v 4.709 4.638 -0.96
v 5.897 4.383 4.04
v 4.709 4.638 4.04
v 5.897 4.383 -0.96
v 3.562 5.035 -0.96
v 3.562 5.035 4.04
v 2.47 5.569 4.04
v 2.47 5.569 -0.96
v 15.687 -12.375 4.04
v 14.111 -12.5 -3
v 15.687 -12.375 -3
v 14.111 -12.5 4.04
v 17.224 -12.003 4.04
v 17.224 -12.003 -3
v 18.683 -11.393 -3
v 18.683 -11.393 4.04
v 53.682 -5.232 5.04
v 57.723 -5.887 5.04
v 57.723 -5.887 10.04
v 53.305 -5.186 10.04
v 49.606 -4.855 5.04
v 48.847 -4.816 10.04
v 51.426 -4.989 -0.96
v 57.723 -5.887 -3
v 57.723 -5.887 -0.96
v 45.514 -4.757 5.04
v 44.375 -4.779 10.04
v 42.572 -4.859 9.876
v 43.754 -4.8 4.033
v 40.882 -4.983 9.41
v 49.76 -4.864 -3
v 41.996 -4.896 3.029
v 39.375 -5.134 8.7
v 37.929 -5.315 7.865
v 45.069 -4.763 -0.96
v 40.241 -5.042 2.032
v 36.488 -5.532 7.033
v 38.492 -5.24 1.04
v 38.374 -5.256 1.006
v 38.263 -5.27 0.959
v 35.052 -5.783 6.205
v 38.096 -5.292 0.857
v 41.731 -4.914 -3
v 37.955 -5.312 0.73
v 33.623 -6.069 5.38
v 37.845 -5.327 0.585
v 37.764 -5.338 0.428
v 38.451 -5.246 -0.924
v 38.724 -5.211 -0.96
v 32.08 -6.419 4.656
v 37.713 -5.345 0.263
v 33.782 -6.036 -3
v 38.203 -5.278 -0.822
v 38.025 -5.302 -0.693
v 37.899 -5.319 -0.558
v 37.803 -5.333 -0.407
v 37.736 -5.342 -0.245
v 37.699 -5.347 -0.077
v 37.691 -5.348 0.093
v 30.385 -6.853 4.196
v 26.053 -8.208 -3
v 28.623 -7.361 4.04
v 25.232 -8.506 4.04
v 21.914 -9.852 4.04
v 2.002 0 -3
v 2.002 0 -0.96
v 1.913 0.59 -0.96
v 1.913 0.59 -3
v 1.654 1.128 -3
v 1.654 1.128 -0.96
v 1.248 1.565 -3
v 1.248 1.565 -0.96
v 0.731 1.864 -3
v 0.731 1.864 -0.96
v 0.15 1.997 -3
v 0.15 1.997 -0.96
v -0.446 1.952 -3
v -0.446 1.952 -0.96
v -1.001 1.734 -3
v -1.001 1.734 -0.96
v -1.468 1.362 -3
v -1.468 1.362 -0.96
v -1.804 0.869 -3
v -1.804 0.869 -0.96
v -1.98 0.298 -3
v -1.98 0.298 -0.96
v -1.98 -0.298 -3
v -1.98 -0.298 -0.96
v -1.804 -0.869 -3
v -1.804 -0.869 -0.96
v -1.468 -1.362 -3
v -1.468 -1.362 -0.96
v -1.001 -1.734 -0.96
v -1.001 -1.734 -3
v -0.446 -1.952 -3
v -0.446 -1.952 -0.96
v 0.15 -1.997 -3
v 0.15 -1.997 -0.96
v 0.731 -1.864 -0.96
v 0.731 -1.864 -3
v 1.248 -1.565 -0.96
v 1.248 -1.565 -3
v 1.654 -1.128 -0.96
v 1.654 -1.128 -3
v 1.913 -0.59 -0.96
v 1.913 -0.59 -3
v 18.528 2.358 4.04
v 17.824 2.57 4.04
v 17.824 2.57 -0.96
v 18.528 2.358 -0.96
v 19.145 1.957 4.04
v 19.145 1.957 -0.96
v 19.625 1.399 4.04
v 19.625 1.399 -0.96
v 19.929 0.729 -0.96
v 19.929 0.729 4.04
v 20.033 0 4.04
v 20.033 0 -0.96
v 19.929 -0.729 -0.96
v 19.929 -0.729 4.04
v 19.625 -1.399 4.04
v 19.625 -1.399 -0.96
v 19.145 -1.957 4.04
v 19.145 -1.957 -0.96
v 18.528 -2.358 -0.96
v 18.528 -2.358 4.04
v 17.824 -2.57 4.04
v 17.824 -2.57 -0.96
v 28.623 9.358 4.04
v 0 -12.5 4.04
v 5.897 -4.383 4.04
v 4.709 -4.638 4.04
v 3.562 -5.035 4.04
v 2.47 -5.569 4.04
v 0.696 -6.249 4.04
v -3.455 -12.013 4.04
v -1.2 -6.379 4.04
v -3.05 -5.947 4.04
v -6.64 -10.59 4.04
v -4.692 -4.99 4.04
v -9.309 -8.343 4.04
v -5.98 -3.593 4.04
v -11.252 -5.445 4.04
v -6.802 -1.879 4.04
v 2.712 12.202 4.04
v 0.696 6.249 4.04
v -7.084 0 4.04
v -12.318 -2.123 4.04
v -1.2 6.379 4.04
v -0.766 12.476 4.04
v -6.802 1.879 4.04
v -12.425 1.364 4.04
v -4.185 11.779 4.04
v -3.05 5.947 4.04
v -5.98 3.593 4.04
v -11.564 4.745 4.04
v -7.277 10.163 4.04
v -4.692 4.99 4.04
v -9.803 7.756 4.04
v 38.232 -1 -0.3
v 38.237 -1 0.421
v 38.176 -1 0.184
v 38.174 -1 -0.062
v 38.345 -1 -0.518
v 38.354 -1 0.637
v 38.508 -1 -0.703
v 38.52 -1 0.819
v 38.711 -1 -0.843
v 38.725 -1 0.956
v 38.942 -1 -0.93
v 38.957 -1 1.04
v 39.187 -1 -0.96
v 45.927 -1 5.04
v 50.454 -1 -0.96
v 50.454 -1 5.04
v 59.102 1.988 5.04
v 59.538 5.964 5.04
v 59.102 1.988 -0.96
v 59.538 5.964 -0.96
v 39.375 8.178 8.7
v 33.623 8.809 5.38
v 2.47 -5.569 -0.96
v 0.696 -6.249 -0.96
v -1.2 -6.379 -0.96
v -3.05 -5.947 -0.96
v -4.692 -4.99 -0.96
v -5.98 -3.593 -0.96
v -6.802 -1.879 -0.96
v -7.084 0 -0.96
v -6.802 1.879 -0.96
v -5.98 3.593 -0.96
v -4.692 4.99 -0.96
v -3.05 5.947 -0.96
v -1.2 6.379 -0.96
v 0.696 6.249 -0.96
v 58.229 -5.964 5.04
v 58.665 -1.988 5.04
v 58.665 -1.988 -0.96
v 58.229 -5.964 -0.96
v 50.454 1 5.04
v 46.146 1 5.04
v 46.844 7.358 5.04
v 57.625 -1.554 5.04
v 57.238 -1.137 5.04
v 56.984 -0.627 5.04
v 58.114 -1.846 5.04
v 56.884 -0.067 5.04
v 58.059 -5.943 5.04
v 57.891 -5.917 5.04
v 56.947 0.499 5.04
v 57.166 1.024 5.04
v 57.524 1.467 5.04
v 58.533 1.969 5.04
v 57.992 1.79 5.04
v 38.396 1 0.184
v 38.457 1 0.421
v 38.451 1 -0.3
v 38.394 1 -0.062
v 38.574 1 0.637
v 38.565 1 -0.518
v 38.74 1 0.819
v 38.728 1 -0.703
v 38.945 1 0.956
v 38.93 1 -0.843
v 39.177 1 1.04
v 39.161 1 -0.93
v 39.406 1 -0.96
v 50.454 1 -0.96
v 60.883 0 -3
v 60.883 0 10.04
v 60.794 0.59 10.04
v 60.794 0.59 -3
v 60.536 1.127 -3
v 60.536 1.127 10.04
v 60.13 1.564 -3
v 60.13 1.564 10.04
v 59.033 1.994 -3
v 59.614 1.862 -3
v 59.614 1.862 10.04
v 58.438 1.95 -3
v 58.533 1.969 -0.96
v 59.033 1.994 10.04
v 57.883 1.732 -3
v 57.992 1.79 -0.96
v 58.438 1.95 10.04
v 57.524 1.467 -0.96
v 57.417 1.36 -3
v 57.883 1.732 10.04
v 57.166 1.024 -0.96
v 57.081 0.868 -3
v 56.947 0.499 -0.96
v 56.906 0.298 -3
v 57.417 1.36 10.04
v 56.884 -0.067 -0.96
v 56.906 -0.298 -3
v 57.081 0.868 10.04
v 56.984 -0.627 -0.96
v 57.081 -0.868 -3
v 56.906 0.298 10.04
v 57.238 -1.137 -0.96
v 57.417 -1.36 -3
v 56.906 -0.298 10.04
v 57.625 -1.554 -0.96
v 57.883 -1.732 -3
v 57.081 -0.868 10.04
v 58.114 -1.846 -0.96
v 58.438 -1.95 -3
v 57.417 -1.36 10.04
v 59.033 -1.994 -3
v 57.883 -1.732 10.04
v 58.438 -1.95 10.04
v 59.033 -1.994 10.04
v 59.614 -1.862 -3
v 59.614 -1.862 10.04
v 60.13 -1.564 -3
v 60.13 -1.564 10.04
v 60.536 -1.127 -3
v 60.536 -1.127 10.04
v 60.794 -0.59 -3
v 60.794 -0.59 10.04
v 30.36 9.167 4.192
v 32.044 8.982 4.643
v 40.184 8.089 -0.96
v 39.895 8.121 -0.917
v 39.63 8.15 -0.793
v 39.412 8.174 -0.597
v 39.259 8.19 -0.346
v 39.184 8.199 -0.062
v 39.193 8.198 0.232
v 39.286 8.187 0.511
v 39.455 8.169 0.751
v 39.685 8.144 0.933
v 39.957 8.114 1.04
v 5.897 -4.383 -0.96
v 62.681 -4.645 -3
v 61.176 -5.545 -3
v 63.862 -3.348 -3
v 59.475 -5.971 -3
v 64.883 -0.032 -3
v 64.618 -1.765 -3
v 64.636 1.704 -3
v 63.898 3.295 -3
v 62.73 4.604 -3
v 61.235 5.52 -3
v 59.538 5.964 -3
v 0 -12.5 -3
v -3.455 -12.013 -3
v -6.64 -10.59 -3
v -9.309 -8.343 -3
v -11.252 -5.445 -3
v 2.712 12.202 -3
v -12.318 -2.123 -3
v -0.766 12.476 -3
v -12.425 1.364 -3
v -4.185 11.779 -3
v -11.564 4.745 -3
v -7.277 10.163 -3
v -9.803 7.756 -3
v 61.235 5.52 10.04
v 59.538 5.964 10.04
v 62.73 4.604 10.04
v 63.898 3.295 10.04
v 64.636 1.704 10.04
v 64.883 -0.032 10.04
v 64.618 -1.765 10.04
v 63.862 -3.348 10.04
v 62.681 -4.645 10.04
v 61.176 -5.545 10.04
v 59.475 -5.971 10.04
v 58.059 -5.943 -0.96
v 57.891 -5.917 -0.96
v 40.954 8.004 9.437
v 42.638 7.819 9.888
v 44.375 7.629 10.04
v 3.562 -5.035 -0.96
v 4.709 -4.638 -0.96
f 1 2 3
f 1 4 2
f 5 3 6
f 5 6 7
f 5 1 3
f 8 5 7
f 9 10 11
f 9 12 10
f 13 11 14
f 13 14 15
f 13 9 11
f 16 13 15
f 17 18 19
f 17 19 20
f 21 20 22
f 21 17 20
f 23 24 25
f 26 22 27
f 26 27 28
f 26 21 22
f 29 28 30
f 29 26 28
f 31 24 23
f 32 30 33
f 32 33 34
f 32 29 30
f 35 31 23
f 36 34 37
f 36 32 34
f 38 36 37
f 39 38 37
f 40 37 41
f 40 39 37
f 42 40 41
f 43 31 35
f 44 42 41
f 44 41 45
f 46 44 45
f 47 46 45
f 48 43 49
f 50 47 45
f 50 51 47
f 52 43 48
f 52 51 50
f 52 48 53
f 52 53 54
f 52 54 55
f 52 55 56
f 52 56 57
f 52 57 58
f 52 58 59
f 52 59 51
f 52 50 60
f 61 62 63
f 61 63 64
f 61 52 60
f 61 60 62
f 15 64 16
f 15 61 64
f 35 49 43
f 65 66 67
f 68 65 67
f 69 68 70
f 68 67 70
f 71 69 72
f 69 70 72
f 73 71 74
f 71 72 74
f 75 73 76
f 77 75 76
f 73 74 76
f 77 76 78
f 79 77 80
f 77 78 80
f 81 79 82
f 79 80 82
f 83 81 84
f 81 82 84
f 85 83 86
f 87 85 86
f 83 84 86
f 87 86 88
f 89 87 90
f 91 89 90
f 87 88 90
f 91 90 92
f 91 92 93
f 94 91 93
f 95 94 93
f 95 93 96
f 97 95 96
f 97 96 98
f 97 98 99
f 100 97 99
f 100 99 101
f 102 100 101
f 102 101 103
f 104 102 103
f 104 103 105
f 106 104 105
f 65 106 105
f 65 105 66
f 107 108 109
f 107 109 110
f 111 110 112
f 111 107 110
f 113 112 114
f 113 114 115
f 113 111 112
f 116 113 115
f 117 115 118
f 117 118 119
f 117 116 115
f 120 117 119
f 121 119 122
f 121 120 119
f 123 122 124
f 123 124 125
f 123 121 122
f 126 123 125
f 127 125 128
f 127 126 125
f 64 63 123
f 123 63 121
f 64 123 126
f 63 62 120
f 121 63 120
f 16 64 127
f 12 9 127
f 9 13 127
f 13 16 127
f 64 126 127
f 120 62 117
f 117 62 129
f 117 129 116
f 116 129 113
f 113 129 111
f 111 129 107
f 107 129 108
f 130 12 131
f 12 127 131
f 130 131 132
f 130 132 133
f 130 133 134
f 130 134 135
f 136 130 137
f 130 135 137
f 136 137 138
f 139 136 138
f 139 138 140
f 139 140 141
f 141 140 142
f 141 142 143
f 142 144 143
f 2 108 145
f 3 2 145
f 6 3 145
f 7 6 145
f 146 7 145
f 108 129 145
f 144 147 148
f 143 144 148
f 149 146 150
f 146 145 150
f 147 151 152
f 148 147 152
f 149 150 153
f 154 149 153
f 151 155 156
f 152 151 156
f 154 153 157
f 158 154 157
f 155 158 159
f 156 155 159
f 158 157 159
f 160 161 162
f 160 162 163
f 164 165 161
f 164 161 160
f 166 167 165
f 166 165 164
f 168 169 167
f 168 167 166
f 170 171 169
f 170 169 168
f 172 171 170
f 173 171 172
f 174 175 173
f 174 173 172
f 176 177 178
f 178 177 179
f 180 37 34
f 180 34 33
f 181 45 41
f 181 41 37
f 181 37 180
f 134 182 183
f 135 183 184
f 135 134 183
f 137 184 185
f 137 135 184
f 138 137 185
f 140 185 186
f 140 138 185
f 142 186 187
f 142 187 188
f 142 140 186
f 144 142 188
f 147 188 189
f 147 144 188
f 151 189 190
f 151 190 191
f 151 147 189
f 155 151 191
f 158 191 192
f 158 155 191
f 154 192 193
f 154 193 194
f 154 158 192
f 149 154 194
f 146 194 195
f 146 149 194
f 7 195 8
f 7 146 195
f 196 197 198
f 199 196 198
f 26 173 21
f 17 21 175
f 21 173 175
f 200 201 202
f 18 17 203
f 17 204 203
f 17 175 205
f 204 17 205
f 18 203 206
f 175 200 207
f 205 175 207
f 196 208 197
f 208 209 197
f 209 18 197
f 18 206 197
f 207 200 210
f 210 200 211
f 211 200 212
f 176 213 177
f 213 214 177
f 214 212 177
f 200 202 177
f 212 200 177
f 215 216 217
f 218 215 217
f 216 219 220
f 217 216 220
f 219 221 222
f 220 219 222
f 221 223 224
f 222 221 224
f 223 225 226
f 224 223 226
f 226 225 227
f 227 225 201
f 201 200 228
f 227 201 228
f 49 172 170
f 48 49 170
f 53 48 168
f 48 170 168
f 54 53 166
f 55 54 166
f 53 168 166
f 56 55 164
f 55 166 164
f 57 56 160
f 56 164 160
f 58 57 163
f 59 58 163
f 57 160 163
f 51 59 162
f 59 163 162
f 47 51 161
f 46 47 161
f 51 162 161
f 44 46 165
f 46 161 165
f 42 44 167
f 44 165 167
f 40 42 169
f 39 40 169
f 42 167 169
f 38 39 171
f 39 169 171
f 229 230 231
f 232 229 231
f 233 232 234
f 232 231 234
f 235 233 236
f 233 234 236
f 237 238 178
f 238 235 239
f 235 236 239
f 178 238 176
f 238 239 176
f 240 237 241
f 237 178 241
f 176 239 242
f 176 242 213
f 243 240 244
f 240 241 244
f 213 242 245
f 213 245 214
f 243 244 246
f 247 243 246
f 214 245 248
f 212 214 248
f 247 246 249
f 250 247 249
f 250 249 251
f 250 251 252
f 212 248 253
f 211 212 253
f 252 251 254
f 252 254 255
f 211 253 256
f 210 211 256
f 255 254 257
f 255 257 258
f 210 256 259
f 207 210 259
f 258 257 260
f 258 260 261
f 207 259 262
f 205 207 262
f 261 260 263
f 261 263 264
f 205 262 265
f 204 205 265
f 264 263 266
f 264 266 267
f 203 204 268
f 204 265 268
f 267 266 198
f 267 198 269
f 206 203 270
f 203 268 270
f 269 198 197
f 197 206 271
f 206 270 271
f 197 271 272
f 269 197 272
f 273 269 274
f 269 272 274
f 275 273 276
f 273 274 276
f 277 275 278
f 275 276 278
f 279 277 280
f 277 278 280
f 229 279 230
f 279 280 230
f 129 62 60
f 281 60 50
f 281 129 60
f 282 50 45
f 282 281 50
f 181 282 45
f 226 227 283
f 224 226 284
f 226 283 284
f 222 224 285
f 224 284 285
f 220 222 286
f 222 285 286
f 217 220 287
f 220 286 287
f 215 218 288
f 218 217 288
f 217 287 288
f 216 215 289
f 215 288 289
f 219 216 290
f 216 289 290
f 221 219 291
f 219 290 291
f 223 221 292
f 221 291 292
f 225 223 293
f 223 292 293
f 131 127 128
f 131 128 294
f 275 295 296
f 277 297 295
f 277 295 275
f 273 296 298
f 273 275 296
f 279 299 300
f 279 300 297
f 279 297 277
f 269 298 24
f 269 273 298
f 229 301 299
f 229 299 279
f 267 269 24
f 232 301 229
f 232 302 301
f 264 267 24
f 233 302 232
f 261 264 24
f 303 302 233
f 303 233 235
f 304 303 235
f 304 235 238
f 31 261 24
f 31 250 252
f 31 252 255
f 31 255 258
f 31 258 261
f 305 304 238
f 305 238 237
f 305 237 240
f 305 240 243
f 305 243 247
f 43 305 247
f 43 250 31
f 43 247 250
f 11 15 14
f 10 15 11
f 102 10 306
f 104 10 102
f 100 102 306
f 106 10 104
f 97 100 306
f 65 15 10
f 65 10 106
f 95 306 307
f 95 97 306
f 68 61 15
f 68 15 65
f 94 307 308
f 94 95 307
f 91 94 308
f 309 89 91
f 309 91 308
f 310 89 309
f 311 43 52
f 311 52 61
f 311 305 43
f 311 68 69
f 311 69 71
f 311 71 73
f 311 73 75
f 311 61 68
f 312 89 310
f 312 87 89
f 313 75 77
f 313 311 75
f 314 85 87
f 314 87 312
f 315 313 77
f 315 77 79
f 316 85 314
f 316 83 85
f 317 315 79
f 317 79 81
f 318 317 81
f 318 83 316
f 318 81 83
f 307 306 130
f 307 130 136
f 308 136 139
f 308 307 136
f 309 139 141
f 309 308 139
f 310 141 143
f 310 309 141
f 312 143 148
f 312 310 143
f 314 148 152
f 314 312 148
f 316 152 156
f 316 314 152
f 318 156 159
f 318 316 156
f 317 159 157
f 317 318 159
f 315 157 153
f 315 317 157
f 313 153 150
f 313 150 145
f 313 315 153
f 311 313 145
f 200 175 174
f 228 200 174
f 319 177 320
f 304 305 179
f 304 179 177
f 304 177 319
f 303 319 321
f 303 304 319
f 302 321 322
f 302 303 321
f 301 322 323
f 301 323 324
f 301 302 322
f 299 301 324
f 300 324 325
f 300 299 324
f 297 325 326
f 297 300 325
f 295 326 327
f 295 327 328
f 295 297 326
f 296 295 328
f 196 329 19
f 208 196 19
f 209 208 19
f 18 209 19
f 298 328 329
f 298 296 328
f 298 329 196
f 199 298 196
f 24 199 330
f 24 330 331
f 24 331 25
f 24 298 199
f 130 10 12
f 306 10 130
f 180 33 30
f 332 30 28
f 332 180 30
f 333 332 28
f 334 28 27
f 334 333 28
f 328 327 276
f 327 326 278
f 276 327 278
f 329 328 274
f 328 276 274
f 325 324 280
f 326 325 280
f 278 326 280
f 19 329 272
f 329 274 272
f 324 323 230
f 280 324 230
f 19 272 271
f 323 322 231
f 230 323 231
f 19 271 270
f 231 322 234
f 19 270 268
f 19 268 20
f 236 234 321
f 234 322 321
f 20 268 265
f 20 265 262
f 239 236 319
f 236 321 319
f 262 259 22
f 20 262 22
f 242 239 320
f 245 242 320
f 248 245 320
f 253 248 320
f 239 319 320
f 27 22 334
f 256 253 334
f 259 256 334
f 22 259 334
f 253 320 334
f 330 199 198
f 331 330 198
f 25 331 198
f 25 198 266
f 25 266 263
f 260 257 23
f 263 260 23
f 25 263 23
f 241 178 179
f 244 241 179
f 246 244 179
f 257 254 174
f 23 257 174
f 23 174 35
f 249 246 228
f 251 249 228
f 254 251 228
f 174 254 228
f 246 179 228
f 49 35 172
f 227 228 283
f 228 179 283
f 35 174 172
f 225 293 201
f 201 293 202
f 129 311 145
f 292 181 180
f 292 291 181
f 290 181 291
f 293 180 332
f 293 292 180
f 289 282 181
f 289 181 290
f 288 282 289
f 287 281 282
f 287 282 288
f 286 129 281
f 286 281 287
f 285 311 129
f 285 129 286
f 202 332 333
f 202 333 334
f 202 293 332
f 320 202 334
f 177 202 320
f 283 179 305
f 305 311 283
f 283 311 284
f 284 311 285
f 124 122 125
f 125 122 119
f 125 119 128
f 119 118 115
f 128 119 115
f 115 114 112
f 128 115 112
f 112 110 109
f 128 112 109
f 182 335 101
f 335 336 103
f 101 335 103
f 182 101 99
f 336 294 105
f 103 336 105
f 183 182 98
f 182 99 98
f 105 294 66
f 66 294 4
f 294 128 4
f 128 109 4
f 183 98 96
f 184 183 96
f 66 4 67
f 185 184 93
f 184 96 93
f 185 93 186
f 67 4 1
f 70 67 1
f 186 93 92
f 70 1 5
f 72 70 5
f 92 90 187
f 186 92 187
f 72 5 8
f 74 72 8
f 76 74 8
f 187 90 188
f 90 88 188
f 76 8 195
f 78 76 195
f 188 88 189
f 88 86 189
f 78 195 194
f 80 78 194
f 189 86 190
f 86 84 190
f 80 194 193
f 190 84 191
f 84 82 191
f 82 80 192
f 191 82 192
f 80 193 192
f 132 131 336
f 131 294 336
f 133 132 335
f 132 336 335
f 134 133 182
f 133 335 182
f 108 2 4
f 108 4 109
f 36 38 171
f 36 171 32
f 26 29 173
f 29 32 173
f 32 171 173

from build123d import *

# Parameters (mm, degrees)
EXTRUDE_1_DEPTH     = 4.04
EXTRUDE_START       = 3
EXTRUDE_2_DEPTH     = 3
EXTRUDE_3_DEPTH     = 6
CUT_EXTRUDE_1_DEPTH = 69.95015268178993
CUT_EXTRUDE_2_DEPTH = 5
DRAFT_1_ANGLE       = 60.000000000000234
CUT_EXTRUDE_3_REACH = 69.351
SKETCH_6_R          = 2.000000000000003
SKETCH_7_R          = 2.002237129098131
CUT_EXTRUDE_4_DEPTH = 5
RIB_1_REACH         = 68.835
SKETCH_8_WALL_W     = 141.6697430182401
SKETCH_8_WALL_H     = 2
FILLET_1_R          = 10
FILLET_2_R          = 10


with BuildPart() as part:
    # 草图1 → 凸台-拉伸1 (new body)
    with BuildSketch(Plane.XY):
        with BuildLine():
            Line((2.711712708194342, 12.202320033019019), (59.53806556534447, 5.964171430093859))
            ThreePointArc((59.53806556534447, 5.964171430093859), (64.81417632321985, -0.9084264437888516), (57.72286495852592, -5.886704197633859))
            ThreePointArc((57.72286495852592, -5.886704197633859), (36.58461274967972, -5.515977162880489), (16.63, -12.5))
            Line((16.63, -12.5), (0, -12.5))
            ThreePointArc((0, -12.5), (-12.425357146028794, 1.364001390626533), (2.711712708194342, 12.202320033019019))
        make_face()
    extrude(amount=EXTRUDE_1_DEPTH)

    # 草图2 → 凸台-拉伸2 (add)
    with BuildSketch(Plane(origin=(0, 0, 0), x_dir=(-1, 0, 0), z_dir=(0, 0, -1)).offset(EXTRUDE_START)):
        with BuildLine():
            Line((-16.629999999999995, -12.500000000000004), (2.3e-15, -12.5))
            ThreePointArc((2.3e-15, -12.5), (12.425357146028796, 1.3640013906265342), (-2.711712708194334, 12.202320033019022))
            Line((-2.711712708194334, 12.202320033019022), (-59.53806556534447, 5.964171430093854))
            ThreePointArc((-59.53806556534447, 5.964171430093854), (-64.81417632321985, -0.9084264437888536), (-57.72286495852591, -5.886704197633859))
            ThreePointArc((-57.72286495852591, -5.886704197633859), (-36.584612749679714, -5.515977162880482), (-16.629999999999995, -12.500000000000004))
        make_face()
    extrude(amount=-EXTRUDE_2_DEPTH)

    # 草图3 → 凸台-拉伸3 (add)
    with BuildSketch(Plane.XY.offset(4.04)):
        with BuildLine():
            Line((31.302864958525912, 9.063708323856956), (59.53806556534447, 5.964171430093859))
            ThreePointArc((59.53806556534447, 5.964171430093859), (64.81417632321985, -0.9084264437888548), (57.72286495852591, -5.886704197633853))
            ThreePointArc((57.72286495852591, -5.886704197633853), (44.47245462008017, -4.776317380993831), (31.302864958525912, -6.611594244587196))
            Line((31.302864958525912, -6.611594244587196), (31.302864958525912, 9.063708323856956))
        make_face()
    extrude(amount=EXTRUDE_3_DEPTH)

    # 草图4 → 切除-拉伸1 (cut, through all)
    with BuildSketch(Plane(origin=(1.3558563540964497, 12.351160016509516, 0), x_dir=(0.9940285716823101, -0.10912011125006546, 0), z_dir=(0.10912011125006545, 0.99402857168231, 0))):
        with BuildLine():
            Line((45.761727224680776, -5.039999999999999), (58.53172722468078, -5.04))
            Line((58.53172722468078, -5.04), (58.53172722468078, 0.96))
            Line((58.53172722468078, 0.96), (39.06172722468078, 0.9599999999999976))
            ThreePointArc((39.06172722468078, 0.9599999999999976), (38.05523868595962, 0.06182278930871615), (38.83352399440517, -1.040000000000001))
            Line((38.83352399440517, -1.040000000000001), (45.761727224680776, -5.039999999999999))
        make_face()
    extrude(amount=-CUT_EXTRUDE_1_DEPTH, mode=Mode.SUBTRACT)

    # 草图5 → 切除-拉伸2 (cut)
    with BuildSketch(Plane.XY.offset(4.04)):
        with BuildLine():
            Line((3.6299942497491204, 4.727481587079438), (17.823503151893238, 2.570486685801488))
            ThreePointArc((17.823503151893238, 2.570486685801488), (20.032864958525913, 0), (17.823503151893238, -2.5704866858014865))
            Line((17.823503151893238, -2.5704866858014865), (3.62999424974912, -4.72748158707944))
            ThreePointArc((3.62999424974912, -4.72748158707944), (-7.084043052340996, 7.8e-16), (3.6299942497491204, 4.727481587079438))
        make_face()
    extrude(amount=-CUT_EXTRUDE_2_DEPTH, mode=Mode.SUBTRACT)

    # 拔模1
    draft_1_faces = [part.faces().sort_by_distance(p)[0] for p in [
        (31.302864958525912, 1.226057039634884, 7.04),
    ]]
    draft(draft_1_faces, Plane(origin=(58.88334489784406, 0, 4.04), x_dir=(1, 0, 0), z_dir=(0, 0, 1)), DRAFT_1_ANGLE)

    # 切除-拉伸3: up to this face of the body (flat: up to its plane)
    cut_extrude_3_end = Plane(part.part.faces().sort_by_distance((20.783576678, 0.227997431, -3))[0])
    # 草图6 → 切除-拉伸3 (cut, up to the picked face)
    with BuildSketch(Plane.XY.offset(10.040000000000001), mode=Mode.PRIVATE) as cut_extrude_3_sk1:
        with Locations((58.88334489784406, 0)):
            Circle(SKETCH_6_R)
    cut_extrude_3_tool1 = split(extrude(cut_extrude_3_sk1.sketch, amount=-CUT_EXTRUDE_3_REACH, mode=Mode.PRIVATE), bisect_by=cut_extrude_3_end, keep=Keep.BOTH, mode=Mode.PRIVATE)
    add(cut_extrude_3_tool1.solids().sort_by(Axis((58.883345, 0, 10.04), (0, 0, -1)))[0], mode=Mode.SUBTRACT)

    # 草图7 → 切除-拉伸4 (cut)
    with BuildSketch(Plane.XY.offset(-0.96)):
        Circle(SKETCH_7_R)
    extrude(amount=-CUT_EXTRUDE_4_DEPTH, mode=Mode.SUBTRACT)

    # 草图8 wall → 筋1 (add, up to next)
    with BuildSketch(Plane(origin=(50.454320705, 0, 2.04), x_dir=(0, 0, -1), z_dir=(-1, 0, 0)), mode=Mode.PRIVATE) as rib_1_sk1:
        Rectangle(SKETCH_8_WALL_W, SKETCH_8_WALL_H)
    rib_1_tool1 = extrude(rib_1_sk1.sketch, amount=RIB_1_REACH, mode=Mode.PRIVATE) - part.part
    add(rib_1_tool1.solids().sort_by_distance((50.454320705, 0, 2.04))[0])

    # 圆角1
    fillet_1_edges = [part.edges().sort_by_distance(p)[0] for p in [
        (16.629999999999992, -12.5, 0.52),
    ]]
    fillet(fillet_1_edges, radius=FILLET_1_R)

    # 圆角2
    fillet_2_edges = [part.edges().sort_by_distance(p)[0] for p in [
        (31.302864958525912, 1.2260570396348758, 4.04),
        (41.69516980393928, 1.5029507858131876, 10.04),
        (3.629994249749121, 4.727481587079438, 1.54),
        (3.62999424974912, -4.72748158707944, 1.54),
    ]]
    fillet(fillet_2_edges, radius=FILLET_2_R)


solid = part.part
